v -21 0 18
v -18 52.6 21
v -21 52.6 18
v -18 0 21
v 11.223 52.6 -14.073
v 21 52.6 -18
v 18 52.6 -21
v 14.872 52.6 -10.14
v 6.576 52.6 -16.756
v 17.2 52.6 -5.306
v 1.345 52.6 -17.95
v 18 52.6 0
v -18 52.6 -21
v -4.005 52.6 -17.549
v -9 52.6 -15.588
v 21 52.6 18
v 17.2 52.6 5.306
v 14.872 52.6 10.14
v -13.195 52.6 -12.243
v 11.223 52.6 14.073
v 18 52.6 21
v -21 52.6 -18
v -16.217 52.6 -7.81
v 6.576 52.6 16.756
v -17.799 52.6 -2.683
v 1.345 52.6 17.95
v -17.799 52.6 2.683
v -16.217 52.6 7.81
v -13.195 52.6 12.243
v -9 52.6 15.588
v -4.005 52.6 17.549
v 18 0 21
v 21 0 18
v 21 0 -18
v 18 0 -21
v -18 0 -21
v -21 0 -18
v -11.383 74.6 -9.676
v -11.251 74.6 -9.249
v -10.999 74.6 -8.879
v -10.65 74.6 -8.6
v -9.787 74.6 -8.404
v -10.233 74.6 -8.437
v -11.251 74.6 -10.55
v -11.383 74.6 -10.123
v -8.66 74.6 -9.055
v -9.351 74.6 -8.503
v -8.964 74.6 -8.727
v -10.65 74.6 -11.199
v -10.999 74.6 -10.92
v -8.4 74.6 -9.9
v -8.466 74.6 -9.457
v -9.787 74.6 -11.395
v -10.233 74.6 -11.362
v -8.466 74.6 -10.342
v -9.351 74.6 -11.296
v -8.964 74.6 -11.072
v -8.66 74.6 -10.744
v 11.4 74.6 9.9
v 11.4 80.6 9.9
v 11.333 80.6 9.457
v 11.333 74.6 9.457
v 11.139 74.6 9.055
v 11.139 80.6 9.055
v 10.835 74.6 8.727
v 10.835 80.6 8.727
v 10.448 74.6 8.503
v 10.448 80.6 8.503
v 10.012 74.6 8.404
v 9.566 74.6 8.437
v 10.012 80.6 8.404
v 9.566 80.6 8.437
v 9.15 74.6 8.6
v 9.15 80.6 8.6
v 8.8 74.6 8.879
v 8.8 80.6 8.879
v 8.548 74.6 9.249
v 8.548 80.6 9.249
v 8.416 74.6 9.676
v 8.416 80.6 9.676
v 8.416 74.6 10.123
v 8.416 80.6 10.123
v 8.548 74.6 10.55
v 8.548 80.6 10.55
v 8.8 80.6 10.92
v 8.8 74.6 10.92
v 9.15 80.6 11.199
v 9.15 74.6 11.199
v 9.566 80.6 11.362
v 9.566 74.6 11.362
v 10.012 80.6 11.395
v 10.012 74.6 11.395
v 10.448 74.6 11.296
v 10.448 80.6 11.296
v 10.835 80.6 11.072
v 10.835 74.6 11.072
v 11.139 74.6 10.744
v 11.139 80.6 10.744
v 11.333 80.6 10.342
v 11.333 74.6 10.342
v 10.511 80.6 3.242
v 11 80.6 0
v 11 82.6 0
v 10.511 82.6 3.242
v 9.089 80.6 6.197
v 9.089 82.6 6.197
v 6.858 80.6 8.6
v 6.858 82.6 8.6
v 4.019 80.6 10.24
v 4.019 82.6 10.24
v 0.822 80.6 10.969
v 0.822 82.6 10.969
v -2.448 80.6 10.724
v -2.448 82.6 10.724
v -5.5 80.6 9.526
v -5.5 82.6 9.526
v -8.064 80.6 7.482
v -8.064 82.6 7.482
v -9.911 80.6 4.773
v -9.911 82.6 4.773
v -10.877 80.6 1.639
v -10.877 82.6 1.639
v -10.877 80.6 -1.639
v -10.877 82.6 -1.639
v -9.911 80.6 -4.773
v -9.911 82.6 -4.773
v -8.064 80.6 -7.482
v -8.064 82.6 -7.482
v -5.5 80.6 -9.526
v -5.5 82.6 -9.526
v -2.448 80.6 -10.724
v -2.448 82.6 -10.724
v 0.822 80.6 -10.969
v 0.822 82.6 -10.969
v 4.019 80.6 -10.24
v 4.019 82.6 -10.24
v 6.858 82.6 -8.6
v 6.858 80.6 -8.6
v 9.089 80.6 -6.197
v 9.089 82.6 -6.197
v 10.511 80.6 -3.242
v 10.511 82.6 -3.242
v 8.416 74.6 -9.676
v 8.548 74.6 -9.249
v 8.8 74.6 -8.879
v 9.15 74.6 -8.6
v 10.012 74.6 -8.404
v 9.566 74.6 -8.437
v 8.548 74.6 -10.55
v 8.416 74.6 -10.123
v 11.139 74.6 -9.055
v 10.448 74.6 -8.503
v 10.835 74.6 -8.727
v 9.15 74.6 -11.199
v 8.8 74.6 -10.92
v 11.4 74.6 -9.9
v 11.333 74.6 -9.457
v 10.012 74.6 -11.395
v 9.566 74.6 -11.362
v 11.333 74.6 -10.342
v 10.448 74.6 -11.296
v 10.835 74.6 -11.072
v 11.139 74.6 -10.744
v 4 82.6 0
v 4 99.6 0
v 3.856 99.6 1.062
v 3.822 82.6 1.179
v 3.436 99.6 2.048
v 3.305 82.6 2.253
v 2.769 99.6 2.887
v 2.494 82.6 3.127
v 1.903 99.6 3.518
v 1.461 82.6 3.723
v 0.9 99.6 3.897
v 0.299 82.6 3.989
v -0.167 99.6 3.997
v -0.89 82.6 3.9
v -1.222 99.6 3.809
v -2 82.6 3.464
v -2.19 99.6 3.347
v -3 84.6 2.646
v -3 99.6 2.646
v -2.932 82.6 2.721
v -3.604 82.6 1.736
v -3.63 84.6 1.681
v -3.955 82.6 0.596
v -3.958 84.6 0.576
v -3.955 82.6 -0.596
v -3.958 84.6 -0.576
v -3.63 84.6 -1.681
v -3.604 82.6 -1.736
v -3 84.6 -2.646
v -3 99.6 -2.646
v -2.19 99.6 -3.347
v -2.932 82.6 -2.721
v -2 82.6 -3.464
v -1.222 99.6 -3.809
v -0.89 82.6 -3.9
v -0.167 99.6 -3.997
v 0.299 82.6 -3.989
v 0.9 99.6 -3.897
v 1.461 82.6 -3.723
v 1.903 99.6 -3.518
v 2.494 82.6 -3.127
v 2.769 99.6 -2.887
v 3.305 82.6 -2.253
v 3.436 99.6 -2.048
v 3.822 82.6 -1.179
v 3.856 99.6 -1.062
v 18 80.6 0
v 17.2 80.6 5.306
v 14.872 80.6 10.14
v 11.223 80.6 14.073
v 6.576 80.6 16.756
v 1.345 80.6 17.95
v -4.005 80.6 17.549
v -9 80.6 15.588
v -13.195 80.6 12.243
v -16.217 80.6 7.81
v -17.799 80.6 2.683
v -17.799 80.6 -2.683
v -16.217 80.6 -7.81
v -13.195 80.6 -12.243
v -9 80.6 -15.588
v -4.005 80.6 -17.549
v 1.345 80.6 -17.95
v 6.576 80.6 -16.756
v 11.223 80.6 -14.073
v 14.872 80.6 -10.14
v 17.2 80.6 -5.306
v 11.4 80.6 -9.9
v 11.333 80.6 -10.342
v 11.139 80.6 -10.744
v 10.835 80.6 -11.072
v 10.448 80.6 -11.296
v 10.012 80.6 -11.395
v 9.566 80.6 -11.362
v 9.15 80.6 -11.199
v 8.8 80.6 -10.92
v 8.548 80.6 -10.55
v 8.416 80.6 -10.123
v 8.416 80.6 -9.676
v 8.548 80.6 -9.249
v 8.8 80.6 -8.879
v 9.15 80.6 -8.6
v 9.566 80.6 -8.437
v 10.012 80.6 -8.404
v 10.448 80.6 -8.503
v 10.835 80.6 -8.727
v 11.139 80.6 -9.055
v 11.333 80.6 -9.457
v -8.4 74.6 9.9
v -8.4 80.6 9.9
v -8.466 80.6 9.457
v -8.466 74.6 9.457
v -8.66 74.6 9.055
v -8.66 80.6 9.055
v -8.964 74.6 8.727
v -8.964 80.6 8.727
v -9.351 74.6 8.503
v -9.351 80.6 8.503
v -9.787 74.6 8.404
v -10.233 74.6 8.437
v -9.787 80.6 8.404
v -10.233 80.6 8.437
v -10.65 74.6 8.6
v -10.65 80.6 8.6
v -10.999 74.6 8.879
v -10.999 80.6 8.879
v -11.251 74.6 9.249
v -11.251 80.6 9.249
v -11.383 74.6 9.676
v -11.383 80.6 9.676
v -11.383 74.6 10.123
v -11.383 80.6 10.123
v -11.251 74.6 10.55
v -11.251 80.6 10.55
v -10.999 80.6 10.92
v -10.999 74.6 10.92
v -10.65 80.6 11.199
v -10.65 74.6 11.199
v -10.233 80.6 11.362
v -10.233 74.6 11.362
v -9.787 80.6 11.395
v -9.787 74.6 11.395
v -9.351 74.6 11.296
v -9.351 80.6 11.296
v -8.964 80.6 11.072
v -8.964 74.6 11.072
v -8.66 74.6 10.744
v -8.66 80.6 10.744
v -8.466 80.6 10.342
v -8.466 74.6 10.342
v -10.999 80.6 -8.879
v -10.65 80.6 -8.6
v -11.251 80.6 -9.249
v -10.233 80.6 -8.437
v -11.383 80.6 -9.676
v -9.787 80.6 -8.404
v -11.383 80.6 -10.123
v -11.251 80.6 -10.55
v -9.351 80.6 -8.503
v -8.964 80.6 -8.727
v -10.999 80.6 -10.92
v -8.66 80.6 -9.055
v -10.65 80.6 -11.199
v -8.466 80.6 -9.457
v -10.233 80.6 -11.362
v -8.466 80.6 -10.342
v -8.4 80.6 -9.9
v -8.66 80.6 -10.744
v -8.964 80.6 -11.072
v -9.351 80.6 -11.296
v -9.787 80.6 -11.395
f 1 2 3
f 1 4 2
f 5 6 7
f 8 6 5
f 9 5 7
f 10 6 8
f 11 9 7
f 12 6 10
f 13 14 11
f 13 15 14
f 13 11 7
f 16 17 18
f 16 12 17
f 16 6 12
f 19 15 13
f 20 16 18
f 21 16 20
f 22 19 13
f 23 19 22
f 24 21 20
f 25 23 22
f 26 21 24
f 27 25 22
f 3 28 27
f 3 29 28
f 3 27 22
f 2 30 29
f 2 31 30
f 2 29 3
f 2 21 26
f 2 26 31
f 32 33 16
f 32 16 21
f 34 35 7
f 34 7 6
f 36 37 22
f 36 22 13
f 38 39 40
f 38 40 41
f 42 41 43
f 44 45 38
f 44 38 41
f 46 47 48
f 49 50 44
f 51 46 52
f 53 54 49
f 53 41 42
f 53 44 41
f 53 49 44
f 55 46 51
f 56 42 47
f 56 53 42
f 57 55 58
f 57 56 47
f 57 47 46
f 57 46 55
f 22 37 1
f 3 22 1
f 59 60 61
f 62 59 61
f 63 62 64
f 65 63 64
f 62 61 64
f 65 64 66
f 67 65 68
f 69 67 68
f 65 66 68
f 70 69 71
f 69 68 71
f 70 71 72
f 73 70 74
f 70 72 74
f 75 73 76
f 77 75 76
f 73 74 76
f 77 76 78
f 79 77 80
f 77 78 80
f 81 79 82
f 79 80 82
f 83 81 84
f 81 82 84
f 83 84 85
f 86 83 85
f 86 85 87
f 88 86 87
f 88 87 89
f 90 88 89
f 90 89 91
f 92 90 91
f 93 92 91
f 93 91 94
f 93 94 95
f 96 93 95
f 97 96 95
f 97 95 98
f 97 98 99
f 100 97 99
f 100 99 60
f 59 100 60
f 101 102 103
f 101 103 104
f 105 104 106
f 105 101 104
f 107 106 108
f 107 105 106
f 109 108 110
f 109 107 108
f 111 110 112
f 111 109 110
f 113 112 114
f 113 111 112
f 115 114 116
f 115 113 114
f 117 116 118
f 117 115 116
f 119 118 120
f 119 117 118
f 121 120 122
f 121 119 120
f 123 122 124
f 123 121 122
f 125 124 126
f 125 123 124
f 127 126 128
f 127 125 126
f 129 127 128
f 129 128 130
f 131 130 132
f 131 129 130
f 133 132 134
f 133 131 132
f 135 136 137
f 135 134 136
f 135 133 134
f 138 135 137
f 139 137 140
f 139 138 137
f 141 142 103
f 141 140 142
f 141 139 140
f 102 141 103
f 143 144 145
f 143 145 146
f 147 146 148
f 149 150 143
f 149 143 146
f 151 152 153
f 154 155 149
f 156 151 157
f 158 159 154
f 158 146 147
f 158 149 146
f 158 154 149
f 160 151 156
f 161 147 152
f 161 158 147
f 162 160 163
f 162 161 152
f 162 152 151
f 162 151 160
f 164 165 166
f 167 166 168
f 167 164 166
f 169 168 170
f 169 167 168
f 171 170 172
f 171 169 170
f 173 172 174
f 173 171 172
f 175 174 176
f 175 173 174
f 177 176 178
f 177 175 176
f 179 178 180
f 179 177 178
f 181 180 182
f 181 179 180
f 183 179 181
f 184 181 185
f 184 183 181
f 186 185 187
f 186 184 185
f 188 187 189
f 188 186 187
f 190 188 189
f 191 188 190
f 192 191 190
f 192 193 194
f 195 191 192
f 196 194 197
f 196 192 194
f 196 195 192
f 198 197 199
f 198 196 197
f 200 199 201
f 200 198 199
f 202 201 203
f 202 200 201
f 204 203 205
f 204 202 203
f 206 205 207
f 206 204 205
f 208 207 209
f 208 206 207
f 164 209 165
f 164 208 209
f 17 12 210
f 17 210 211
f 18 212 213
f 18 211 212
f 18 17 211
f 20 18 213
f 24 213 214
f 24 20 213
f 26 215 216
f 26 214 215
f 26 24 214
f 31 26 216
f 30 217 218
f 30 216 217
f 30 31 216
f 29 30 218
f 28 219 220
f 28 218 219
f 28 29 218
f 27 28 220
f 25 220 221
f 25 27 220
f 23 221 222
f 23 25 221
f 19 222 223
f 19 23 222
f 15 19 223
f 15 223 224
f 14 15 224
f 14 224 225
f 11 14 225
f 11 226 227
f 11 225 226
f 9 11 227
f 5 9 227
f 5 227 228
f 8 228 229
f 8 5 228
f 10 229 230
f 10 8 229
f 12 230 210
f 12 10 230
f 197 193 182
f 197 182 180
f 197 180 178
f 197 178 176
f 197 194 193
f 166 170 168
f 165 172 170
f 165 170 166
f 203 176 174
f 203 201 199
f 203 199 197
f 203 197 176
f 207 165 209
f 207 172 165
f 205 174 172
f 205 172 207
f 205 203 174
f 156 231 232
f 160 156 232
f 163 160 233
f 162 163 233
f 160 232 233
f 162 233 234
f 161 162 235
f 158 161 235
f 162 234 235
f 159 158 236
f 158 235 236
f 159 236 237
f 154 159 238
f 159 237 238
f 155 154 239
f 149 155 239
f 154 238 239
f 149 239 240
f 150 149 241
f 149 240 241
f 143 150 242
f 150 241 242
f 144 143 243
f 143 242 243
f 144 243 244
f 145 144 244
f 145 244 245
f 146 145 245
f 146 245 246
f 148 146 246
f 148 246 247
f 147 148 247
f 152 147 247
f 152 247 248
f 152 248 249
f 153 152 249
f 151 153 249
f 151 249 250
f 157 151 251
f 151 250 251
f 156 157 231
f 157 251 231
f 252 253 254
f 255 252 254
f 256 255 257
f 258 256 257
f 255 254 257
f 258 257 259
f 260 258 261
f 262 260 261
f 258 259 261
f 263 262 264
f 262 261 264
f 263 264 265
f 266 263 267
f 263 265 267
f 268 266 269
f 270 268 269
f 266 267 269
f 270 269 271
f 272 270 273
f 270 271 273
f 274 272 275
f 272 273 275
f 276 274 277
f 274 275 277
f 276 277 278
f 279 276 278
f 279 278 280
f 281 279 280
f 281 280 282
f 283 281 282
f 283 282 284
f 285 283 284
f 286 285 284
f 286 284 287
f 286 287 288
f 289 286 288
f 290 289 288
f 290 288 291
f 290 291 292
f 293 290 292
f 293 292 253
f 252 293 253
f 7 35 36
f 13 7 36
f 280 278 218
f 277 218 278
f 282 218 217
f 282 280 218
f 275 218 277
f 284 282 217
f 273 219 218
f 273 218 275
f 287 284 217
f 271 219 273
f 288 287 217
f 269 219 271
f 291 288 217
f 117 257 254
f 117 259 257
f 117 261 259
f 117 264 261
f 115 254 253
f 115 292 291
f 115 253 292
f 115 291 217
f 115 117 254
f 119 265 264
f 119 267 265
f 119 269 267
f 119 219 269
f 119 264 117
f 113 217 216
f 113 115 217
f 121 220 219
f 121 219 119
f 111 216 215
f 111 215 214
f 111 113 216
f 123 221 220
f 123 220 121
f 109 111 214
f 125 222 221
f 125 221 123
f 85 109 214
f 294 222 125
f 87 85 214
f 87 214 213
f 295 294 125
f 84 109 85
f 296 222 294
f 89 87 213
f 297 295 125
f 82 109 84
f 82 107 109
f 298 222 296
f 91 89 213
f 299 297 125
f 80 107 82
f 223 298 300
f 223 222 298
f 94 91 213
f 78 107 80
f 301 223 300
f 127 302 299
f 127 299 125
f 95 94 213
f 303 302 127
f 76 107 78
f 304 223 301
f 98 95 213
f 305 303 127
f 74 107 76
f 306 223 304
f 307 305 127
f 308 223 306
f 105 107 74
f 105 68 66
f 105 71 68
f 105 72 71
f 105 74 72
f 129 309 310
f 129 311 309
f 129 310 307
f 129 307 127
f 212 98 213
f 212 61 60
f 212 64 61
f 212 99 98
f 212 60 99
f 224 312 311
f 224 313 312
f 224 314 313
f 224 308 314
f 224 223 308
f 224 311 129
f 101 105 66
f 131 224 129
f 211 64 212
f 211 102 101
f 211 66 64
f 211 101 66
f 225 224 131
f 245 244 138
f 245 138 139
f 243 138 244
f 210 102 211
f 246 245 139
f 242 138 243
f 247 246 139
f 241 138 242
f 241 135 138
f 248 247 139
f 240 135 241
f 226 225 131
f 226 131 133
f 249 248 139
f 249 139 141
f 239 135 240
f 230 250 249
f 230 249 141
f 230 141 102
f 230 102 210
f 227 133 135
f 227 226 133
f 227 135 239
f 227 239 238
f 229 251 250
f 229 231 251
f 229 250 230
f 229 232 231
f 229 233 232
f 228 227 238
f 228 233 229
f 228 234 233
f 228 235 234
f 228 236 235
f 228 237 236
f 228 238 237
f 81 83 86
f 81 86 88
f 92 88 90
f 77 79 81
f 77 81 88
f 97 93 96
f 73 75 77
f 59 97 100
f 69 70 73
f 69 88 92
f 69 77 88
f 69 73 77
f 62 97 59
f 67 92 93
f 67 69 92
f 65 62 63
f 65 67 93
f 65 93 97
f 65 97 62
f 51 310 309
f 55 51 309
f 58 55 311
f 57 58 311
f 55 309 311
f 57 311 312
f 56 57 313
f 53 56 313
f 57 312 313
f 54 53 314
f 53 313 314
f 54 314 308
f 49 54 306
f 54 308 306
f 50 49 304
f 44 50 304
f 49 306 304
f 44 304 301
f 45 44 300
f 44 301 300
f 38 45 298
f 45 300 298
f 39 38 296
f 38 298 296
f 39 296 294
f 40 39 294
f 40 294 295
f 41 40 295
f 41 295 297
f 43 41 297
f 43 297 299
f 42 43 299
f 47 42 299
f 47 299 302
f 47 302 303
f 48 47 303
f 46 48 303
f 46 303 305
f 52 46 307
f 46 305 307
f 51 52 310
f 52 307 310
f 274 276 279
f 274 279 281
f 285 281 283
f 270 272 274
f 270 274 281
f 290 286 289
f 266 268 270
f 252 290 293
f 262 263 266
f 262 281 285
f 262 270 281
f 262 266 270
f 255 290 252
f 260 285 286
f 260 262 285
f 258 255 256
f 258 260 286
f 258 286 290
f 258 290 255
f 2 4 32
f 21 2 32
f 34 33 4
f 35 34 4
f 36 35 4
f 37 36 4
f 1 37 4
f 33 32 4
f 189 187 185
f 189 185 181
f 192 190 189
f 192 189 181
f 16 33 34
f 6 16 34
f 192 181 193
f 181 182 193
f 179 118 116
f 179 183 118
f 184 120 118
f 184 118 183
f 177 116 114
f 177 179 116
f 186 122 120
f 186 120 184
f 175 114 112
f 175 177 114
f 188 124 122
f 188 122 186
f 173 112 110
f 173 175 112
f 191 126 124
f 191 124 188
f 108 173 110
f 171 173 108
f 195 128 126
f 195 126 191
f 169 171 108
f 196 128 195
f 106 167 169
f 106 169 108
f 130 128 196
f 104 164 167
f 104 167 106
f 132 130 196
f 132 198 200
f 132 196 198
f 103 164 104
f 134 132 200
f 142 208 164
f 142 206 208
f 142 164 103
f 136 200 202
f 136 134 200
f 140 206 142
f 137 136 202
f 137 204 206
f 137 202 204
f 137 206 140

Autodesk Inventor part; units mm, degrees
ref_plane "YZ Plane" through (0, 0, 0) normal (1, 0, 0) x (0, 1, 0)
ref_plane "XZ Plane" through (0, 0, 0) normal (0, 1, 0) x (-1, 0, 0)
ref_plane "XY Plane" through (0, 0, 0) normal (0, 0, 1) x (1, 0, 0)
sketch "草圖1" plane through (0, 0, 0) normal (0, 1, 0) x (-1, 0, 0)
  line L0 (18, 21) -> (-18, 21)
  line L1 (-21, 18) -> (-21, -18)
  line L2 (-18, -21) -> (18, -21)
  line L3 (21, -18) -> (21, 18)
  line L4 (21, 21) -> (-21, -21) construction
  line L5 (-21, 21) -> (21, -21) construction
  line L6 (21, -18) -> (18, -21)
  line L7 (-18, -21) -> (-21, -18)
  line L8 (-21, 18) -> (-18, 21)
  line L9 (18, 21) -> (21, 18)
  point P0 (0, 0)
  dimension "d0" = 42
  dimension "d1" = 42
  dimension "d2" = 3
  dimension "d3" = 3
  dimension "d4" = 3
  dimension "d5" = 3
  dimension "d6" = 3
  dimension "d7" = 3
  dimension "d8" = 3
  dimension "d9" = 3
extrude "擠出1" add sketch "草圖1" along normal blind 52.6
sketch "草圖2" plane through (0, 52.6, 0) normal (0, 1, 0) x (1, 0, 0)
  circle A0 centre (0, 0) radius 18
  dimension "d12" = 36
extrude "擠出2" add sketch "草圖2" along normal blind 28
sketch "草圖3" plane through (0, 80.6, 0) normal (0, 1, 0) x (1, 0, 0)
  circle A0 centre (0, 0) radius 14 construction
  circle A1 centre (0, 0) radius 11
  line L0 (0, 0) -> (-19.5, -19.5) construction
  line L1 (-21, -18) -> (-18, -21) projected
  circle A2 centre (-9.8995, -9.8995) radius 1.5
  circle A3 centre (9.8995, -9.8995) radius 1.5
  circle A4 centre (9.8995, 9.8995) radius 1.5
  circle A5 centre (-9.8995, 9.8995) radius 1.5
  dimension "d15" = 28
  dimension "d16" = 22
  dimension "d18" = 3
  dimension "d21" = 360
extrude "擠出3" cut sketch "草圖3" against normal blind 6 contours A2 | A3 | A4 | A5
extrude "擠出4" add sketch "草圖3" along normal blind 2 contours A1
sketch "草圖4" plane through (0, 82.6, 0) normal (0, 1, 0) x (1, 0, 0)
  circle A0 centre (0, 0) radius 4
  dimension "d27" = 8
extrude "擠出5" add sketch "草圖4" along normal blind 17
sketch "草圖5" plane through (0, 99.6, 0) normal (0, 1, 0) x (1, 0, 0)
  circle A0 centre (0, 0) radius 4 projected
  line L0 (-3, -2.6458) -> (-3, 2.6458)
  dimension "d30" = 7
extrude "擠出6" cut sketch "草圖5" against normal blind 15 contours L0 A0 picked at (-3.1815, -0.6179)
sketch "草圖7" plane through (0, 0, 0) normal (0, -1, 0) x (1, 0, 0)
  point P0 (0, 0)
  point P1 (0, 0)
equation "\"d3\" = d2"
equation "\"d4\" = d2"
equation "\"d5\" = d4"
equation "\"d6\" = d2"
equation "\"d7\" = d6"
equation "\"d8\" = d2"
equation "\"d9\" = d8"
properties part number "stepper 42-27"
